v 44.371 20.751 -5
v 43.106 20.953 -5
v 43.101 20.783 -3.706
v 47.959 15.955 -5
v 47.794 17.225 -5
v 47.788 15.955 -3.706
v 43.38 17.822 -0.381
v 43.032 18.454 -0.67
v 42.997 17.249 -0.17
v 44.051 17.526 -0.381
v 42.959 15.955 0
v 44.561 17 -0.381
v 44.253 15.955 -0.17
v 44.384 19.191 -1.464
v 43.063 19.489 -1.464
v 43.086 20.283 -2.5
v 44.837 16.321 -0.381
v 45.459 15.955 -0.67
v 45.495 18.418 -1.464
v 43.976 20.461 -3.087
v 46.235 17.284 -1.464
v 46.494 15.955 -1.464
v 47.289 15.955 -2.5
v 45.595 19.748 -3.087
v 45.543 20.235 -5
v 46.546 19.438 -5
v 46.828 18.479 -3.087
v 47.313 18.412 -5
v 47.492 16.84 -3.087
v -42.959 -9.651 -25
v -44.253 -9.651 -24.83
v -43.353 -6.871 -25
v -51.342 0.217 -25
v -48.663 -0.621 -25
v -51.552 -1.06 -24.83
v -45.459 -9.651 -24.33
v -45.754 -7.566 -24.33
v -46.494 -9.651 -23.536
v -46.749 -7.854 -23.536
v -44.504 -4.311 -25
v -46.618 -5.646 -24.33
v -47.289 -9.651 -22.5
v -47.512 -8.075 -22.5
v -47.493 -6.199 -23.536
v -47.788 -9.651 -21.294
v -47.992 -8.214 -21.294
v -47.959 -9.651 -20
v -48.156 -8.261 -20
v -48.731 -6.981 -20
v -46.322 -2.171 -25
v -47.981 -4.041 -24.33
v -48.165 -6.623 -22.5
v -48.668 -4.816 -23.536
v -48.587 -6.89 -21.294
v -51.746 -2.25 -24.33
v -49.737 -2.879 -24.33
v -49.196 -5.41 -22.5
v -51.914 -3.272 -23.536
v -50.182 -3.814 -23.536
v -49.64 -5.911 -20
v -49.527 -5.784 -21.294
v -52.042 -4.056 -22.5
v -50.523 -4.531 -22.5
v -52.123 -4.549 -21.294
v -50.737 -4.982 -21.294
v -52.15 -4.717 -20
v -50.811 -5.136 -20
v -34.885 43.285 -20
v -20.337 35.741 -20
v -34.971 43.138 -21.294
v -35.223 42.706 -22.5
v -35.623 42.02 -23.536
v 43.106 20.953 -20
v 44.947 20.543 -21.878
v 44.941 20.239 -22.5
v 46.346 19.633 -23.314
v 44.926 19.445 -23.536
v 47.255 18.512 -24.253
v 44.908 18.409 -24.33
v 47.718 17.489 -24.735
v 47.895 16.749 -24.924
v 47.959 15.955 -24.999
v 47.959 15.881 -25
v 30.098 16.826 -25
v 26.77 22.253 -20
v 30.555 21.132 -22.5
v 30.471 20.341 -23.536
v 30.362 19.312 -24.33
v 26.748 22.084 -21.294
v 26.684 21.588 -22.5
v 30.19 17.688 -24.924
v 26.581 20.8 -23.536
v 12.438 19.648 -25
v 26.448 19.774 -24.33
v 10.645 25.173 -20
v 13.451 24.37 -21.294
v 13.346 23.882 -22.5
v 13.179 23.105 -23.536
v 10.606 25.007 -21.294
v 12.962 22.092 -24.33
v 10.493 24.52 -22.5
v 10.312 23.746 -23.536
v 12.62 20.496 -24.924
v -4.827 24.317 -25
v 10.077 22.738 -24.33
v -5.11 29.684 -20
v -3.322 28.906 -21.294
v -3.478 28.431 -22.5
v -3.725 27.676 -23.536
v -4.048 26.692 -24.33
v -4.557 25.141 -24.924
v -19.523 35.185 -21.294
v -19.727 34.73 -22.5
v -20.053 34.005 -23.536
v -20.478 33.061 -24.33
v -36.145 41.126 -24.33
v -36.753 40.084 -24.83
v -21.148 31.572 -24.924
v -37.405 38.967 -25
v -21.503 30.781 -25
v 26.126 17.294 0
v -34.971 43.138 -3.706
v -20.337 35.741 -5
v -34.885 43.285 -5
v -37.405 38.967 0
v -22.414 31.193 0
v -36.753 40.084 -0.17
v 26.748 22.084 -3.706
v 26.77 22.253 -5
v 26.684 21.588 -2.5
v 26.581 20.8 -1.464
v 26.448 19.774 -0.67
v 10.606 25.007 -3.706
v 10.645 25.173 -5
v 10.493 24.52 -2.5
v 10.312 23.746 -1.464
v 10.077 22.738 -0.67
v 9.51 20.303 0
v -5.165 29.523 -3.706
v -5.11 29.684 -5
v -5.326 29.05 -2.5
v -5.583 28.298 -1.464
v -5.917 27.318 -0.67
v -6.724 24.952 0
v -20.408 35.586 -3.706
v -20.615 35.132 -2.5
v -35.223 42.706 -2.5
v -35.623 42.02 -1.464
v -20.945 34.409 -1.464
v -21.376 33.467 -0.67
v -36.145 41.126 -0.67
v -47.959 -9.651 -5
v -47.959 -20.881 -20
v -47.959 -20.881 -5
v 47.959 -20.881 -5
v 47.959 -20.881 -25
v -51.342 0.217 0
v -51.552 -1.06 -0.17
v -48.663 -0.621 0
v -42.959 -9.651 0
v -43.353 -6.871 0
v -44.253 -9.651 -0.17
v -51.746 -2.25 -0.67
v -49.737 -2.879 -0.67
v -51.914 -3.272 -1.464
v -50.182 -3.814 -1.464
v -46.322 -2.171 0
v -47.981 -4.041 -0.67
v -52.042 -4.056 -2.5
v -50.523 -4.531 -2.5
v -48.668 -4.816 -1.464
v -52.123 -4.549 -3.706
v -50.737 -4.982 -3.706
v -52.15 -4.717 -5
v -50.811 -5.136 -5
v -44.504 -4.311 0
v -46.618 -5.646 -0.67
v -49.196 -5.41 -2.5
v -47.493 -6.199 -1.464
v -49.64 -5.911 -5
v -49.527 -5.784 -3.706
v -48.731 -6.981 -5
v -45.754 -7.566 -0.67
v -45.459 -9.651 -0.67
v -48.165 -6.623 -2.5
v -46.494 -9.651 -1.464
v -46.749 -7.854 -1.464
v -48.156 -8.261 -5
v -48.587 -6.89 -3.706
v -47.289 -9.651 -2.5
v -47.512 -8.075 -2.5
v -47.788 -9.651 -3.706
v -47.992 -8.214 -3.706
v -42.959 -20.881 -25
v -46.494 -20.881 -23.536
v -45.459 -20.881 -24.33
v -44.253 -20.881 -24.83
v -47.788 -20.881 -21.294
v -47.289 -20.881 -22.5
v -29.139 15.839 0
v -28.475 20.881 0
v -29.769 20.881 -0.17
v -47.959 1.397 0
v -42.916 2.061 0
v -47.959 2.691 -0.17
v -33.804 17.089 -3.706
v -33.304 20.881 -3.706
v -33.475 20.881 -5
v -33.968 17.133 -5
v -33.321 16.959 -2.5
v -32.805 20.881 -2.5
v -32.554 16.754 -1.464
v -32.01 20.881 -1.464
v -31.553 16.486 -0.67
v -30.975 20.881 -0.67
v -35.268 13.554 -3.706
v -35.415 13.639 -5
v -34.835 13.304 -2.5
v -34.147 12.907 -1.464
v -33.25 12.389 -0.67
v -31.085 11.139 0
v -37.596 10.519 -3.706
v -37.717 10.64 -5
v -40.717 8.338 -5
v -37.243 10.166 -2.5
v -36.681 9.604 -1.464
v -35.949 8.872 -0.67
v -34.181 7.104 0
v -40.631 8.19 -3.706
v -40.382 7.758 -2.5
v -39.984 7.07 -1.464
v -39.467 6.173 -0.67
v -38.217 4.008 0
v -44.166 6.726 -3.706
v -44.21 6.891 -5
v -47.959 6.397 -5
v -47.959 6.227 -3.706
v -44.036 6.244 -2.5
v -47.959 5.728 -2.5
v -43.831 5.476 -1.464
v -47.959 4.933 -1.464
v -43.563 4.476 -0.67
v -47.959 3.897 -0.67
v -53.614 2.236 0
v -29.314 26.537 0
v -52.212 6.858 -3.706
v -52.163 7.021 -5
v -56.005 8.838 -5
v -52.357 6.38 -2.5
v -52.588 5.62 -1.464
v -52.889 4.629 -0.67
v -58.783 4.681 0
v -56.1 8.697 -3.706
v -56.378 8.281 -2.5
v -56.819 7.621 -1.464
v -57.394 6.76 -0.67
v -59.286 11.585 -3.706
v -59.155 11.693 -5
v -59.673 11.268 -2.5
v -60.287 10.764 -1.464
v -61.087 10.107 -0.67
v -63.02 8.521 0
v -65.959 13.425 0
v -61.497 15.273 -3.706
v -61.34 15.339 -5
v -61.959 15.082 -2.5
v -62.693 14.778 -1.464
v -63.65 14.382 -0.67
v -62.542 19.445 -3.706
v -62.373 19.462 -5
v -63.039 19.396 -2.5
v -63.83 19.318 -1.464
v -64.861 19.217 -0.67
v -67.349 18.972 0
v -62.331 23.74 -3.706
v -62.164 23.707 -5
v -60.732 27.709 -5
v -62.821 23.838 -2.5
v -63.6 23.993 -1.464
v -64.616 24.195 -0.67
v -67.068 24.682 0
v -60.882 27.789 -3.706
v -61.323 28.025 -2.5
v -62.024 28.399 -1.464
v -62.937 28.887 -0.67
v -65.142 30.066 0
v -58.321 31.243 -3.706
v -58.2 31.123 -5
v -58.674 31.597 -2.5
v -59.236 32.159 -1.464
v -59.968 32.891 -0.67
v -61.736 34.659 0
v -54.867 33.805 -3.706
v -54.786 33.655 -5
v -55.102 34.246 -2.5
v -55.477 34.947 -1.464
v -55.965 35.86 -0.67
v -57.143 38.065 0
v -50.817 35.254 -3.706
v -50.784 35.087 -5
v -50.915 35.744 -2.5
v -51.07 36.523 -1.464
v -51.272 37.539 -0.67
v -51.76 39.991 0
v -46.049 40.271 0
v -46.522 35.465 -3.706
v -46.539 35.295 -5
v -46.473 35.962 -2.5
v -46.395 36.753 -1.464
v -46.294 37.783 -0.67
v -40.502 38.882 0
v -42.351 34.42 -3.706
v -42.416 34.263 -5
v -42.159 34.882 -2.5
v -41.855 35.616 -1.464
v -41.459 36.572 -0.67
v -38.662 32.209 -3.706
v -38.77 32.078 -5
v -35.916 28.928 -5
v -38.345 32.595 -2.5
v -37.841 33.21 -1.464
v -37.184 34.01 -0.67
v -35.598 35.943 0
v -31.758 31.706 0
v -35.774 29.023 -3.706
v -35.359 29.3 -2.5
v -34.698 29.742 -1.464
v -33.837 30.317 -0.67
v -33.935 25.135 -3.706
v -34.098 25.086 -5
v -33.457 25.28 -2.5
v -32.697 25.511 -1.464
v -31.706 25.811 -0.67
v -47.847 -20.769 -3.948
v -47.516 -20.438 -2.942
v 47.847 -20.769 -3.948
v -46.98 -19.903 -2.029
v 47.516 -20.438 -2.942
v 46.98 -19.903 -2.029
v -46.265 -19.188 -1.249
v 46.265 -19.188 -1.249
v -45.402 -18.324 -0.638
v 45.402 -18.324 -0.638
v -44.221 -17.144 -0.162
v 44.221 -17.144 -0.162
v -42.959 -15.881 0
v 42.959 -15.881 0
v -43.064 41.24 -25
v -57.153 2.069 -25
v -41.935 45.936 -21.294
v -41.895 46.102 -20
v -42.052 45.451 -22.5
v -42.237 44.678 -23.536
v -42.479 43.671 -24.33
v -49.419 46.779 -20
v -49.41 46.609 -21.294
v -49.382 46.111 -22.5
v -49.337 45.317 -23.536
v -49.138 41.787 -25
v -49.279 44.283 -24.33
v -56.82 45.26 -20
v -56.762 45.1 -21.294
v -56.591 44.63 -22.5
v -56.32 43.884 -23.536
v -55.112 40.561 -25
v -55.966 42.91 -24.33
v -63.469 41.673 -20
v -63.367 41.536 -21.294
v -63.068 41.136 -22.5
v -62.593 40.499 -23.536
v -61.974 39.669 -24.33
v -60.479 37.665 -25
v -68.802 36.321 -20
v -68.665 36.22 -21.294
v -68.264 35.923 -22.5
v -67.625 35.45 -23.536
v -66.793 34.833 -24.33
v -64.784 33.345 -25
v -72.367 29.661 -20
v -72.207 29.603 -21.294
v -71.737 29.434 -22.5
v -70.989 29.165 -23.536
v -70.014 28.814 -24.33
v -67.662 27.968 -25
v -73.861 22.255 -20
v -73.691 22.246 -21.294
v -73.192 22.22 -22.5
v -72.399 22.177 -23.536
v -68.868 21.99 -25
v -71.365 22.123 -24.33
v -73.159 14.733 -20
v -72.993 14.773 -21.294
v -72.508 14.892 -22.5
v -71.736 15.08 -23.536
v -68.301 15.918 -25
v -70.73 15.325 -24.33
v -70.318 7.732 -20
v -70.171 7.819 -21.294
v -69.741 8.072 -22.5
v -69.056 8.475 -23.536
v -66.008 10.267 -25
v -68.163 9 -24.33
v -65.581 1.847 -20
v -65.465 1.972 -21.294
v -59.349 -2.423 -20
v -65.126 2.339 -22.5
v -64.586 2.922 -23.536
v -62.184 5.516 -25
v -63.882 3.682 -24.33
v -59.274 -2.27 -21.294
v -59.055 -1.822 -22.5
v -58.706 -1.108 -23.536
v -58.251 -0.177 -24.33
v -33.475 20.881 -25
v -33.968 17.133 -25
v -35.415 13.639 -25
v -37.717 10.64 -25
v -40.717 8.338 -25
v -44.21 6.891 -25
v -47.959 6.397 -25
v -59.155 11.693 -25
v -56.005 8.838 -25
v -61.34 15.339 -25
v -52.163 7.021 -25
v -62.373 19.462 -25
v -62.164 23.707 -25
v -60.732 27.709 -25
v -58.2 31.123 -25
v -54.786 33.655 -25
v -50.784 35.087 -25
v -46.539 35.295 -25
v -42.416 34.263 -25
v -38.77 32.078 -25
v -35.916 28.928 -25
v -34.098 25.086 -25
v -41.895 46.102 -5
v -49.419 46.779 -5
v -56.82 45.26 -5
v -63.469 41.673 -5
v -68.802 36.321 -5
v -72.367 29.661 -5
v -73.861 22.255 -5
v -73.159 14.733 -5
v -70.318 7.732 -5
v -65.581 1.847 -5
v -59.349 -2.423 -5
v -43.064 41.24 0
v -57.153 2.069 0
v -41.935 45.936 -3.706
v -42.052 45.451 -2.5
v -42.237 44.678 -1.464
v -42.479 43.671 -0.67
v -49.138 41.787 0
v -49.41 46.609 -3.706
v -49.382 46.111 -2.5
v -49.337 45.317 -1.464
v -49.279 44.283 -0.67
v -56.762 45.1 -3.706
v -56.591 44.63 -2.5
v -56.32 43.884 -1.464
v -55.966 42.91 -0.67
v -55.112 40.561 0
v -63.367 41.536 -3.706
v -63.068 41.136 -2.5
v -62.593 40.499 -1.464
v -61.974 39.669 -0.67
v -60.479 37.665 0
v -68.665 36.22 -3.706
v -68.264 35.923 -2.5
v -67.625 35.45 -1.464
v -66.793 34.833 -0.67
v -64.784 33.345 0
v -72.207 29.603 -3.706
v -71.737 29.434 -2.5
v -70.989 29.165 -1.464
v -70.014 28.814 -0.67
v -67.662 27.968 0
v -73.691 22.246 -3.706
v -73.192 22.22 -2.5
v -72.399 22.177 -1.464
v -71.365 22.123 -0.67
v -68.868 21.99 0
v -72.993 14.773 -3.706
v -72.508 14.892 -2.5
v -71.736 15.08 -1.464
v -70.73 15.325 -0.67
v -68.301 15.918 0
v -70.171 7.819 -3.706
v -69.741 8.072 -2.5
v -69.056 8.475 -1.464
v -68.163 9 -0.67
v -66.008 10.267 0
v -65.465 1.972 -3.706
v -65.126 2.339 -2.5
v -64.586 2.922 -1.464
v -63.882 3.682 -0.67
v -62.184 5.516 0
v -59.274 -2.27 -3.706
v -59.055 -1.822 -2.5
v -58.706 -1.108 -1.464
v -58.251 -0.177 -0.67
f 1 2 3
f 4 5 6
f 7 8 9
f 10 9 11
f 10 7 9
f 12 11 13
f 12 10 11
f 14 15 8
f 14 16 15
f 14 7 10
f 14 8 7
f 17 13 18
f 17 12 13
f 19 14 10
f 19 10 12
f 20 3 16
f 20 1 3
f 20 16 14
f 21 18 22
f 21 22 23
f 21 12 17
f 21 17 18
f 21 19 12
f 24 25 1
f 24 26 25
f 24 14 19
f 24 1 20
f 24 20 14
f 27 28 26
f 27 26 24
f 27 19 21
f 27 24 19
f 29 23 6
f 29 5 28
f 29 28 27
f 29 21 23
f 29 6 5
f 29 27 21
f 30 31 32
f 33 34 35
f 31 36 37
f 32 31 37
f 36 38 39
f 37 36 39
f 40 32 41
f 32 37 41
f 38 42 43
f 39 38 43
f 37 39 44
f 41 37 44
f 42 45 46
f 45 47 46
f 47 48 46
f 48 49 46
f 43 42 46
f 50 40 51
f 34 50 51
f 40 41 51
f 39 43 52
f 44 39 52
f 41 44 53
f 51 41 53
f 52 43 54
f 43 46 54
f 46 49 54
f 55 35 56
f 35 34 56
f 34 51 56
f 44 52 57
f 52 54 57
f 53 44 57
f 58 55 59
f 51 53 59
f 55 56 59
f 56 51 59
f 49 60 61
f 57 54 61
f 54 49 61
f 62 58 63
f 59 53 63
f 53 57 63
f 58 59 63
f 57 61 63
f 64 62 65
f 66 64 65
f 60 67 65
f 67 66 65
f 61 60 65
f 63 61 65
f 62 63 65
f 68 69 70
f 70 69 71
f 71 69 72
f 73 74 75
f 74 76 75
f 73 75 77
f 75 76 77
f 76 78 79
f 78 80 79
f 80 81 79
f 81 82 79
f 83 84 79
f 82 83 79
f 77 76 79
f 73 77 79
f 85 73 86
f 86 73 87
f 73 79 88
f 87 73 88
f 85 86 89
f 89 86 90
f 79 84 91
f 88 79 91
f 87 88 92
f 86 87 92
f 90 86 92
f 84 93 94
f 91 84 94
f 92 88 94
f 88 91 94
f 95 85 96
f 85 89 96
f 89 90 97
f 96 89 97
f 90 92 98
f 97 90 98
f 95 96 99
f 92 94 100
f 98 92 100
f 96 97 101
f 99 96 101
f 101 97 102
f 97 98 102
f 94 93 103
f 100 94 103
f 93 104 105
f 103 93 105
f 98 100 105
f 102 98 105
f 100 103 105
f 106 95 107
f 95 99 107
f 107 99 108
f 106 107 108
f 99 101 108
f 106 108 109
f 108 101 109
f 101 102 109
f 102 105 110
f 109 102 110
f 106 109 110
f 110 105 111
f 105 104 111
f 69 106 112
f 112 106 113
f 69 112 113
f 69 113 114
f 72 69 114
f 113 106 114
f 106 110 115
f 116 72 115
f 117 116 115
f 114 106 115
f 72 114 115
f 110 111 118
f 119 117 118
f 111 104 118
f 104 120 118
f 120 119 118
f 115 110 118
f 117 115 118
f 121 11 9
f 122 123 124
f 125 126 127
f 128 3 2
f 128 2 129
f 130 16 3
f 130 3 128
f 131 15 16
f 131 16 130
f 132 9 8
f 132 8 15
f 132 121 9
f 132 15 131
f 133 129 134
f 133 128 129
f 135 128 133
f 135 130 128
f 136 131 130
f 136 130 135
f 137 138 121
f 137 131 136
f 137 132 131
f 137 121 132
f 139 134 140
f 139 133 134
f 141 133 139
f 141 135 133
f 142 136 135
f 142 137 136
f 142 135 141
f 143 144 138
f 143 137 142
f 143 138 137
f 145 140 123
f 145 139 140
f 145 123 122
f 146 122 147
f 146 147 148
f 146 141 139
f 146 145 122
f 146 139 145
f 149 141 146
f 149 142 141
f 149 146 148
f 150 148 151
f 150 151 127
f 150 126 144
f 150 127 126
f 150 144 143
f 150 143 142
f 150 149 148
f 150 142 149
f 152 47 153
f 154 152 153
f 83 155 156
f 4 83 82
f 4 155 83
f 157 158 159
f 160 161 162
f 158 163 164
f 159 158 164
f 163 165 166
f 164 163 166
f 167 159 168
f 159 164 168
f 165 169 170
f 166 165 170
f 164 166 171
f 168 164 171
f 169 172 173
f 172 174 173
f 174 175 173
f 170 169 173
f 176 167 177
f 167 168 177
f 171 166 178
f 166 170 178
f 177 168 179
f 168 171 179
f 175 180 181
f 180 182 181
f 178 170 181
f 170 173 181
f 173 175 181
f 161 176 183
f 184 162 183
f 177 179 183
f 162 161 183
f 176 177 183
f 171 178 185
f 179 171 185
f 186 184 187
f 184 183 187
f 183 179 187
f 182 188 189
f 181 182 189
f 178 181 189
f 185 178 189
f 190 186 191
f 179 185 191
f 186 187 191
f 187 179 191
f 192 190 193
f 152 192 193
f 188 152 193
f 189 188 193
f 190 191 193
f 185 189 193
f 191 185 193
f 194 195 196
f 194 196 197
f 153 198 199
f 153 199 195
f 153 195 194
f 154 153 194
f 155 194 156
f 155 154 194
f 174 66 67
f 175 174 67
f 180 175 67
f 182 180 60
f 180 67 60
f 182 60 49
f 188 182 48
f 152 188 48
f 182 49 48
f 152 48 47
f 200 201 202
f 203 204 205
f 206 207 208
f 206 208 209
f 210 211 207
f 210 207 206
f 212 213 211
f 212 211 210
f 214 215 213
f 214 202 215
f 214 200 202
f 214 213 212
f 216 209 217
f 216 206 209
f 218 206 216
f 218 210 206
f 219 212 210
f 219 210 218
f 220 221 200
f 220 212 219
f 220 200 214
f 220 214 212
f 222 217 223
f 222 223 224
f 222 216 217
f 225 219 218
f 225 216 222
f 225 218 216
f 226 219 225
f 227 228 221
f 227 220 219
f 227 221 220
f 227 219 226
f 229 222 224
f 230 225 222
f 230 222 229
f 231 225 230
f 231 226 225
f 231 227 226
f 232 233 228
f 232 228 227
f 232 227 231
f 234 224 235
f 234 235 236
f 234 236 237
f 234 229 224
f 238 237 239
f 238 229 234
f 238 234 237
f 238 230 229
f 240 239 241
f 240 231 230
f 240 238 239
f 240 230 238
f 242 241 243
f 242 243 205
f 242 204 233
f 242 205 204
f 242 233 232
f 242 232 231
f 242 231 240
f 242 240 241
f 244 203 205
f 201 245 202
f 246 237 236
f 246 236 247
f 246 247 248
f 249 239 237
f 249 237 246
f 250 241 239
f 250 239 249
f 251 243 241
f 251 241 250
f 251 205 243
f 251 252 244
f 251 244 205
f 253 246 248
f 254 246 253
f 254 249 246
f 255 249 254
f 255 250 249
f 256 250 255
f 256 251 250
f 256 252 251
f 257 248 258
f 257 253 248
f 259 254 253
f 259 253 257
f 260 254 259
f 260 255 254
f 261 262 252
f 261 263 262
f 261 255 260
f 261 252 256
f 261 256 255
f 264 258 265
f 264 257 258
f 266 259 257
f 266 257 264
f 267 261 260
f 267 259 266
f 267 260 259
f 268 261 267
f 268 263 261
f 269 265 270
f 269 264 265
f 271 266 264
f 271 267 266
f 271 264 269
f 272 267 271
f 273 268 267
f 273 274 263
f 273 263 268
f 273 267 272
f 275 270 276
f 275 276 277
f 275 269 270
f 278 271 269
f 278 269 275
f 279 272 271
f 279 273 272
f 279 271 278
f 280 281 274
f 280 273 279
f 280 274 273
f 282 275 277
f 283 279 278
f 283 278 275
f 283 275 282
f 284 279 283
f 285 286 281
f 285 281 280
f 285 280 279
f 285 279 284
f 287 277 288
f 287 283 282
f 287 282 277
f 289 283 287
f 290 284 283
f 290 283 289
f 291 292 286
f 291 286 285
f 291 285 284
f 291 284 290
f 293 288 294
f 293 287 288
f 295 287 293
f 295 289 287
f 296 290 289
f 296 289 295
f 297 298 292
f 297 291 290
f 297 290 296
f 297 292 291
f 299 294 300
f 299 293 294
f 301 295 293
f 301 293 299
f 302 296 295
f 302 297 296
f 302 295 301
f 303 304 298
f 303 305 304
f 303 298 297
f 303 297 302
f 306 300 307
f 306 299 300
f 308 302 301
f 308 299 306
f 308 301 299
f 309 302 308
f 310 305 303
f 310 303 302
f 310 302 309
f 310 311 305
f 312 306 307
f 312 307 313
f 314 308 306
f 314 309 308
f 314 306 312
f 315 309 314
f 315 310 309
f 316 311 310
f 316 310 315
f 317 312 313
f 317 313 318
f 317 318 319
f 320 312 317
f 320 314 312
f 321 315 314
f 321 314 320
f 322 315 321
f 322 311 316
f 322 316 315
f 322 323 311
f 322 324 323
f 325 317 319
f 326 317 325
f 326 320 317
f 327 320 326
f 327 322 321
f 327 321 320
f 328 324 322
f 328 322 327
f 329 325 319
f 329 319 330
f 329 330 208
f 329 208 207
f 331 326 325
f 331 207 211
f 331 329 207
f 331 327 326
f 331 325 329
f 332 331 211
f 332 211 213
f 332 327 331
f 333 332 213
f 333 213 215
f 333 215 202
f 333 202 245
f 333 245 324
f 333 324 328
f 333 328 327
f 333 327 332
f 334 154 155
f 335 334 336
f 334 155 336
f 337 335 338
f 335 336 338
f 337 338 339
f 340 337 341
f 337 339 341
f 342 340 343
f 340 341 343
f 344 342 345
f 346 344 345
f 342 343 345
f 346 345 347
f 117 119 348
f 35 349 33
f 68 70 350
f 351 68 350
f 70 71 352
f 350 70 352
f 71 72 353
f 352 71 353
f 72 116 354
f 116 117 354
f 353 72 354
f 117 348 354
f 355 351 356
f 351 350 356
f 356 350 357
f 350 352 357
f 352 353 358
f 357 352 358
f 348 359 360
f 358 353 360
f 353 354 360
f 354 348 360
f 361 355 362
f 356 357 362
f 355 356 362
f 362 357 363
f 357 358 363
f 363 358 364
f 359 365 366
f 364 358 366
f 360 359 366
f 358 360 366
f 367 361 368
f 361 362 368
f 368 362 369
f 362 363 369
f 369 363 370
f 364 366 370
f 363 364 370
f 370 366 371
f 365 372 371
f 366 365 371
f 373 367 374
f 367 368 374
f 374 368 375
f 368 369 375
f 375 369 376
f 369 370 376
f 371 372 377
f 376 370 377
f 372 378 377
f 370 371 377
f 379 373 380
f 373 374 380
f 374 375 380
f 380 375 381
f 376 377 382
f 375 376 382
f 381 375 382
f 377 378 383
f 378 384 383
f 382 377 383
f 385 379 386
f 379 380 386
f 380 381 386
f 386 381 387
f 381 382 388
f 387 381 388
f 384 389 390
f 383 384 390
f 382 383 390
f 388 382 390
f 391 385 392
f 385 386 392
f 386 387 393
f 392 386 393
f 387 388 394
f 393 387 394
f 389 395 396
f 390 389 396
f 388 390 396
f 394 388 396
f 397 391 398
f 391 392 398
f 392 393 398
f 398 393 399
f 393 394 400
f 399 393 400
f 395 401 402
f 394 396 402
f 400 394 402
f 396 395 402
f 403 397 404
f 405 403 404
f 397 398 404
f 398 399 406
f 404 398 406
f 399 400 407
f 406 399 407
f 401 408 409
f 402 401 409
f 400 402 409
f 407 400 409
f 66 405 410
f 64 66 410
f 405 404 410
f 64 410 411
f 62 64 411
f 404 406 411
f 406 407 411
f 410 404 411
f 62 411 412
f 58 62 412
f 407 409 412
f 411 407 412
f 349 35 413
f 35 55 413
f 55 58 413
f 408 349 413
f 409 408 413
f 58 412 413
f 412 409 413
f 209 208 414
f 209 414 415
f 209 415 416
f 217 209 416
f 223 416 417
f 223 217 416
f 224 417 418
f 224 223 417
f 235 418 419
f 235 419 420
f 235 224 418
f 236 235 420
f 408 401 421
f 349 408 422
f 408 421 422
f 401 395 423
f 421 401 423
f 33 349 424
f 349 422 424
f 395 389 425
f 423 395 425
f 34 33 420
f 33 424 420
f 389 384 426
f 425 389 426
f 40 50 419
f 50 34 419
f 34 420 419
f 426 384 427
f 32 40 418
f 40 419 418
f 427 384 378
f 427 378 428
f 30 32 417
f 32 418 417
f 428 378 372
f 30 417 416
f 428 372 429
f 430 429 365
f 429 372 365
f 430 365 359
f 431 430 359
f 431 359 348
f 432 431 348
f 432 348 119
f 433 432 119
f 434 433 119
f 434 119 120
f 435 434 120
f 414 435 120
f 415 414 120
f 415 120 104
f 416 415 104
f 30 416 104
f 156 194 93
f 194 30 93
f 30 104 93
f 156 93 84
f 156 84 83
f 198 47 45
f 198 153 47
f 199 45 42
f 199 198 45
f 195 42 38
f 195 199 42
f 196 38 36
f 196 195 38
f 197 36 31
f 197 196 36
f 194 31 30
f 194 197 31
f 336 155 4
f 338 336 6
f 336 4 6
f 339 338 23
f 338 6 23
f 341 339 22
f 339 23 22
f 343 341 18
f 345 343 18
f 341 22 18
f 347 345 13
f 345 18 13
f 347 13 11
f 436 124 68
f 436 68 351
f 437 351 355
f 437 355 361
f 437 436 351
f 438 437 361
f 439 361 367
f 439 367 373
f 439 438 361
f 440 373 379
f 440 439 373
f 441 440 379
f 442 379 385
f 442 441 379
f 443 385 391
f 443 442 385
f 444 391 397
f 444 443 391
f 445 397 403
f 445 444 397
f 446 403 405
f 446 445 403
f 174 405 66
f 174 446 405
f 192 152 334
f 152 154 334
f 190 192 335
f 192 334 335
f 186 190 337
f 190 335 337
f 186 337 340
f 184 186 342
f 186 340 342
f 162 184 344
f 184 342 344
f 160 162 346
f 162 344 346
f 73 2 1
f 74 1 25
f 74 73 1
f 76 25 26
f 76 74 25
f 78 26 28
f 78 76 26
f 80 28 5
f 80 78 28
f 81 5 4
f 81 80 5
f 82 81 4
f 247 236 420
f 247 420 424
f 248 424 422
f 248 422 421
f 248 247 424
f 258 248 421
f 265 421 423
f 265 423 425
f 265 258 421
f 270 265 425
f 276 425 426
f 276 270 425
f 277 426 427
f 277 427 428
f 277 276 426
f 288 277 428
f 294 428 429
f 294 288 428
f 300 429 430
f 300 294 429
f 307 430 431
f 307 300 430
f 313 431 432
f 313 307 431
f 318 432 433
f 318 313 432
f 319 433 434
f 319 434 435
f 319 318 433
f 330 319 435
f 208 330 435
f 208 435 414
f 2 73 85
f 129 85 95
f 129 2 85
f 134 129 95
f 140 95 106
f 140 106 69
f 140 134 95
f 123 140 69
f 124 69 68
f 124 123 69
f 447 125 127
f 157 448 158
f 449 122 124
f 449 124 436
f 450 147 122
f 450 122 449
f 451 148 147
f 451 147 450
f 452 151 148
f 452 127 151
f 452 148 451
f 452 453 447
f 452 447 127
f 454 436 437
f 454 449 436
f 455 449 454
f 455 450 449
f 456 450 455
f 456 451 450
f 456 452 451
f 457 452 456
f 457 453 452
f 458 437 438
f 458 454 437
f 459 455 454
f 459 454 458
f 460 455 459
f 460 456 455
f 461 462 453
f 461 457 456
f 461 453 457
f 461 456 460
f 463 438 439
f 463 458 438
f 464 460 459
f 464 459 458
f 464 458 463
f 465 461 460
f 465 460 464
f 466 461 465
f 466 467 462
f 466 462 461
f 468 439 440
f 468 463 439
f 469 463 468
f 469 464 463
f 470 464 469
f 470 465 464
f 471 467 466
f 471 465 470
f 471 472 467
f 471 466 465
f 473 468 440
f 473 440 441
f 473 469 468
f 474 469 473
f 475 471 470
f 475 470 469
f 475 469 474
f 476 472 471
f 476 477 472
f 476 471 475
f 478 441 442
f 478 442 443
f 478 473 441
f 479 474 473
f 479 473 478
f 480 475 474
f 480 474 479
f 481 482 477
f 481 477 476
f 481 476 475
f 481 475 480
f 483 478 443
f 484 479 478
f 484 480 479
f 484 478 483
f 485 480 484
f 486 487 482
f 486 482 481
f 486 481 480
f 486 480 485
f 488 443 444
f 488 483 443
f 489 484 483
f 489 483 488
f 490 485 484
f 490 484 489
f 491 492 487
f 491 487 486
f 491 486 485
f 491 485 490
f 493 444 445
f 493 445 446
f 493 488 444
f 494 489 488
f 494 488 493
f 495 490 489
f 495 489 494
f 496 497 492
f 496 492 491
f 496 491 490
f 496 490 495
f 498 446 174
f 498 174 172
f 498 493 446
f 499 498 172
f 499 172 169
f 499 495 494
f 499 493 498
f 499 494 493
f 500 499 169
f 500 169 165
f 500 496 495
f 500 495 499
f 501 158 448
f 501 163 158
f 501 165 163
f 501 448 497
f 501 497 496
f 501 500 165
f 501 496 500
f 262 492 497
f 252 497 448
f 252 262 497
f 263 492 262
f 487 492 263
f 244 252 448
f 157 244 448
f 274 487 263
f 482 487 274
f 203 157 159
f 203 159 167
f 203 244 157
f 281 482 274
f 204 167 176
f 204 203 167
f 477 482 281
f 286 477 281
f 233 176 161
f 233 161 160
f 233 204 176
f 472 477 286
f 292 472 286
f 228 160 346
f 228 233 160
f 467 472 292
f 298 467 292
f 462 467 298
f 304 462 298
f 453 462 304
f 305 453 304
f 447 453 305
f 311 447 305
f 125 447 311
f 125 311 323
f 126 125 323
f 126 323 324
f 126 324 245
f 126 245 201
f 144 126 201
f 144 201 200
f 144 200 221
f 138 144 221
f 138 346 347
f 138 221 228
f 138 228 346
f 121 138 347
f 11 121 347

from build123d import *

# Parameters (mm, degrees)
F1_DEPTH = 25
F3_R     = 5


# Not quite as in the source:
# - the program builds the solid bodies; features that only make, move or delete a surface that nothing else refers to are left out


with BuildPart() as f1:
    # F0 (on Top) → F1 (new body)
    with BuildSketch(Plane.XY):
        with BuildLine():
            Line((-22.0192338504, 20.8813082427), (47.958523035, 20.8813082427))
            ThreePointArc((47.958523035, 20.8813082427), (5.048852146, 26.5810643591), (-34.884897805, 43.2850366545))
            ThreePointArc((-34.884897805, 43.2850366545), (-25.4644430478, 33.7988578917), (-22.0192338504, 20.8813082427))
        make_face()
        with BuildLine():
            ThreePointArc((-34.884897805, 43.2850366545), (-72.9983264837, 27.652937785), (-47.958523035, -5.057980942))
            Line((-47.958523035, -5.057980942), (-47.958523035, 6.3973983269))
            ThreePointArc((-47.958523035, 6.3973983269), (-58.2001939546, 31.1229791622), (-33.4746131192, 20.8813082427))
            Line((-33.4746131192, 20.8813082427), (-22.0192338504, 20.8813082427))
            ThreePointArc((-22.0192338504, 20.8813082427), (-25.4644430478, 33.7988578917), (-34.884897805, 43.2850366545))
        make_face()
        with BuildLine():
            Line((-47.958523035, 6.3973983269), (-47.958523035, -5.057980942))
            ThreePointArc((-47.958523035, -5.057980942), (-29.6166757534, 2.539460961), (-22.0192338504, 20.8813082427))
            Line((-22.0192338504, 20.8813082427), (-33.4746131192, 20.8813082427))
            ThreePointArc((-33.4746131192, 20.8813082427), (-37.7168521155, 10.6396373231), (-47.958523035, 6.3973983269))
        make_face()
        with BuildLine():
            Line((-47.958523035, -5.057980942), (-47.958523035, -20.8813082427))
            Line((-47.958523035, -20.8813082427), (47.958523035, -20.8813082427))
            Line((47.958523035, -20.8813082427), (47.958523035, 20.8813082427))
            Line((47.958523035, 20.8813082427), (-22.0192338504, 20.8813082427))
            ThreePointArc((-22.0192338504, 20.8813082427), (-29.6166757534, 2.539460961), (-47.958523035, -5.057980942))
        make_face()
    extrude(amount=-F1_DEPTH)

    # F3
    f3_edges = [f1.edges().sort_by_distance(p)[0] for p in [
        (5.048852, 26.581064, 0),
        (-72.998326, 27.652938, 0),
        (-47.958523, -12.969645, 0),
        (0, -20.881308, 0),
        (47.958523, 0, 0),
        (-62.442433, 20.881308, 0),
        (47.958523, 20.881308, -12.5),
        (-34.884898, 43.285037, -12.5),
        (5.048852, 26.581064, -25),
        (-47.958523, -5.057981, -12.5),
        (-72.998326, 27.652938, -25),
        (-47.958523, -12.969645, -25),
    ]]
    fillet(f3_edges, radius=F3_R)


solid = f1.part
